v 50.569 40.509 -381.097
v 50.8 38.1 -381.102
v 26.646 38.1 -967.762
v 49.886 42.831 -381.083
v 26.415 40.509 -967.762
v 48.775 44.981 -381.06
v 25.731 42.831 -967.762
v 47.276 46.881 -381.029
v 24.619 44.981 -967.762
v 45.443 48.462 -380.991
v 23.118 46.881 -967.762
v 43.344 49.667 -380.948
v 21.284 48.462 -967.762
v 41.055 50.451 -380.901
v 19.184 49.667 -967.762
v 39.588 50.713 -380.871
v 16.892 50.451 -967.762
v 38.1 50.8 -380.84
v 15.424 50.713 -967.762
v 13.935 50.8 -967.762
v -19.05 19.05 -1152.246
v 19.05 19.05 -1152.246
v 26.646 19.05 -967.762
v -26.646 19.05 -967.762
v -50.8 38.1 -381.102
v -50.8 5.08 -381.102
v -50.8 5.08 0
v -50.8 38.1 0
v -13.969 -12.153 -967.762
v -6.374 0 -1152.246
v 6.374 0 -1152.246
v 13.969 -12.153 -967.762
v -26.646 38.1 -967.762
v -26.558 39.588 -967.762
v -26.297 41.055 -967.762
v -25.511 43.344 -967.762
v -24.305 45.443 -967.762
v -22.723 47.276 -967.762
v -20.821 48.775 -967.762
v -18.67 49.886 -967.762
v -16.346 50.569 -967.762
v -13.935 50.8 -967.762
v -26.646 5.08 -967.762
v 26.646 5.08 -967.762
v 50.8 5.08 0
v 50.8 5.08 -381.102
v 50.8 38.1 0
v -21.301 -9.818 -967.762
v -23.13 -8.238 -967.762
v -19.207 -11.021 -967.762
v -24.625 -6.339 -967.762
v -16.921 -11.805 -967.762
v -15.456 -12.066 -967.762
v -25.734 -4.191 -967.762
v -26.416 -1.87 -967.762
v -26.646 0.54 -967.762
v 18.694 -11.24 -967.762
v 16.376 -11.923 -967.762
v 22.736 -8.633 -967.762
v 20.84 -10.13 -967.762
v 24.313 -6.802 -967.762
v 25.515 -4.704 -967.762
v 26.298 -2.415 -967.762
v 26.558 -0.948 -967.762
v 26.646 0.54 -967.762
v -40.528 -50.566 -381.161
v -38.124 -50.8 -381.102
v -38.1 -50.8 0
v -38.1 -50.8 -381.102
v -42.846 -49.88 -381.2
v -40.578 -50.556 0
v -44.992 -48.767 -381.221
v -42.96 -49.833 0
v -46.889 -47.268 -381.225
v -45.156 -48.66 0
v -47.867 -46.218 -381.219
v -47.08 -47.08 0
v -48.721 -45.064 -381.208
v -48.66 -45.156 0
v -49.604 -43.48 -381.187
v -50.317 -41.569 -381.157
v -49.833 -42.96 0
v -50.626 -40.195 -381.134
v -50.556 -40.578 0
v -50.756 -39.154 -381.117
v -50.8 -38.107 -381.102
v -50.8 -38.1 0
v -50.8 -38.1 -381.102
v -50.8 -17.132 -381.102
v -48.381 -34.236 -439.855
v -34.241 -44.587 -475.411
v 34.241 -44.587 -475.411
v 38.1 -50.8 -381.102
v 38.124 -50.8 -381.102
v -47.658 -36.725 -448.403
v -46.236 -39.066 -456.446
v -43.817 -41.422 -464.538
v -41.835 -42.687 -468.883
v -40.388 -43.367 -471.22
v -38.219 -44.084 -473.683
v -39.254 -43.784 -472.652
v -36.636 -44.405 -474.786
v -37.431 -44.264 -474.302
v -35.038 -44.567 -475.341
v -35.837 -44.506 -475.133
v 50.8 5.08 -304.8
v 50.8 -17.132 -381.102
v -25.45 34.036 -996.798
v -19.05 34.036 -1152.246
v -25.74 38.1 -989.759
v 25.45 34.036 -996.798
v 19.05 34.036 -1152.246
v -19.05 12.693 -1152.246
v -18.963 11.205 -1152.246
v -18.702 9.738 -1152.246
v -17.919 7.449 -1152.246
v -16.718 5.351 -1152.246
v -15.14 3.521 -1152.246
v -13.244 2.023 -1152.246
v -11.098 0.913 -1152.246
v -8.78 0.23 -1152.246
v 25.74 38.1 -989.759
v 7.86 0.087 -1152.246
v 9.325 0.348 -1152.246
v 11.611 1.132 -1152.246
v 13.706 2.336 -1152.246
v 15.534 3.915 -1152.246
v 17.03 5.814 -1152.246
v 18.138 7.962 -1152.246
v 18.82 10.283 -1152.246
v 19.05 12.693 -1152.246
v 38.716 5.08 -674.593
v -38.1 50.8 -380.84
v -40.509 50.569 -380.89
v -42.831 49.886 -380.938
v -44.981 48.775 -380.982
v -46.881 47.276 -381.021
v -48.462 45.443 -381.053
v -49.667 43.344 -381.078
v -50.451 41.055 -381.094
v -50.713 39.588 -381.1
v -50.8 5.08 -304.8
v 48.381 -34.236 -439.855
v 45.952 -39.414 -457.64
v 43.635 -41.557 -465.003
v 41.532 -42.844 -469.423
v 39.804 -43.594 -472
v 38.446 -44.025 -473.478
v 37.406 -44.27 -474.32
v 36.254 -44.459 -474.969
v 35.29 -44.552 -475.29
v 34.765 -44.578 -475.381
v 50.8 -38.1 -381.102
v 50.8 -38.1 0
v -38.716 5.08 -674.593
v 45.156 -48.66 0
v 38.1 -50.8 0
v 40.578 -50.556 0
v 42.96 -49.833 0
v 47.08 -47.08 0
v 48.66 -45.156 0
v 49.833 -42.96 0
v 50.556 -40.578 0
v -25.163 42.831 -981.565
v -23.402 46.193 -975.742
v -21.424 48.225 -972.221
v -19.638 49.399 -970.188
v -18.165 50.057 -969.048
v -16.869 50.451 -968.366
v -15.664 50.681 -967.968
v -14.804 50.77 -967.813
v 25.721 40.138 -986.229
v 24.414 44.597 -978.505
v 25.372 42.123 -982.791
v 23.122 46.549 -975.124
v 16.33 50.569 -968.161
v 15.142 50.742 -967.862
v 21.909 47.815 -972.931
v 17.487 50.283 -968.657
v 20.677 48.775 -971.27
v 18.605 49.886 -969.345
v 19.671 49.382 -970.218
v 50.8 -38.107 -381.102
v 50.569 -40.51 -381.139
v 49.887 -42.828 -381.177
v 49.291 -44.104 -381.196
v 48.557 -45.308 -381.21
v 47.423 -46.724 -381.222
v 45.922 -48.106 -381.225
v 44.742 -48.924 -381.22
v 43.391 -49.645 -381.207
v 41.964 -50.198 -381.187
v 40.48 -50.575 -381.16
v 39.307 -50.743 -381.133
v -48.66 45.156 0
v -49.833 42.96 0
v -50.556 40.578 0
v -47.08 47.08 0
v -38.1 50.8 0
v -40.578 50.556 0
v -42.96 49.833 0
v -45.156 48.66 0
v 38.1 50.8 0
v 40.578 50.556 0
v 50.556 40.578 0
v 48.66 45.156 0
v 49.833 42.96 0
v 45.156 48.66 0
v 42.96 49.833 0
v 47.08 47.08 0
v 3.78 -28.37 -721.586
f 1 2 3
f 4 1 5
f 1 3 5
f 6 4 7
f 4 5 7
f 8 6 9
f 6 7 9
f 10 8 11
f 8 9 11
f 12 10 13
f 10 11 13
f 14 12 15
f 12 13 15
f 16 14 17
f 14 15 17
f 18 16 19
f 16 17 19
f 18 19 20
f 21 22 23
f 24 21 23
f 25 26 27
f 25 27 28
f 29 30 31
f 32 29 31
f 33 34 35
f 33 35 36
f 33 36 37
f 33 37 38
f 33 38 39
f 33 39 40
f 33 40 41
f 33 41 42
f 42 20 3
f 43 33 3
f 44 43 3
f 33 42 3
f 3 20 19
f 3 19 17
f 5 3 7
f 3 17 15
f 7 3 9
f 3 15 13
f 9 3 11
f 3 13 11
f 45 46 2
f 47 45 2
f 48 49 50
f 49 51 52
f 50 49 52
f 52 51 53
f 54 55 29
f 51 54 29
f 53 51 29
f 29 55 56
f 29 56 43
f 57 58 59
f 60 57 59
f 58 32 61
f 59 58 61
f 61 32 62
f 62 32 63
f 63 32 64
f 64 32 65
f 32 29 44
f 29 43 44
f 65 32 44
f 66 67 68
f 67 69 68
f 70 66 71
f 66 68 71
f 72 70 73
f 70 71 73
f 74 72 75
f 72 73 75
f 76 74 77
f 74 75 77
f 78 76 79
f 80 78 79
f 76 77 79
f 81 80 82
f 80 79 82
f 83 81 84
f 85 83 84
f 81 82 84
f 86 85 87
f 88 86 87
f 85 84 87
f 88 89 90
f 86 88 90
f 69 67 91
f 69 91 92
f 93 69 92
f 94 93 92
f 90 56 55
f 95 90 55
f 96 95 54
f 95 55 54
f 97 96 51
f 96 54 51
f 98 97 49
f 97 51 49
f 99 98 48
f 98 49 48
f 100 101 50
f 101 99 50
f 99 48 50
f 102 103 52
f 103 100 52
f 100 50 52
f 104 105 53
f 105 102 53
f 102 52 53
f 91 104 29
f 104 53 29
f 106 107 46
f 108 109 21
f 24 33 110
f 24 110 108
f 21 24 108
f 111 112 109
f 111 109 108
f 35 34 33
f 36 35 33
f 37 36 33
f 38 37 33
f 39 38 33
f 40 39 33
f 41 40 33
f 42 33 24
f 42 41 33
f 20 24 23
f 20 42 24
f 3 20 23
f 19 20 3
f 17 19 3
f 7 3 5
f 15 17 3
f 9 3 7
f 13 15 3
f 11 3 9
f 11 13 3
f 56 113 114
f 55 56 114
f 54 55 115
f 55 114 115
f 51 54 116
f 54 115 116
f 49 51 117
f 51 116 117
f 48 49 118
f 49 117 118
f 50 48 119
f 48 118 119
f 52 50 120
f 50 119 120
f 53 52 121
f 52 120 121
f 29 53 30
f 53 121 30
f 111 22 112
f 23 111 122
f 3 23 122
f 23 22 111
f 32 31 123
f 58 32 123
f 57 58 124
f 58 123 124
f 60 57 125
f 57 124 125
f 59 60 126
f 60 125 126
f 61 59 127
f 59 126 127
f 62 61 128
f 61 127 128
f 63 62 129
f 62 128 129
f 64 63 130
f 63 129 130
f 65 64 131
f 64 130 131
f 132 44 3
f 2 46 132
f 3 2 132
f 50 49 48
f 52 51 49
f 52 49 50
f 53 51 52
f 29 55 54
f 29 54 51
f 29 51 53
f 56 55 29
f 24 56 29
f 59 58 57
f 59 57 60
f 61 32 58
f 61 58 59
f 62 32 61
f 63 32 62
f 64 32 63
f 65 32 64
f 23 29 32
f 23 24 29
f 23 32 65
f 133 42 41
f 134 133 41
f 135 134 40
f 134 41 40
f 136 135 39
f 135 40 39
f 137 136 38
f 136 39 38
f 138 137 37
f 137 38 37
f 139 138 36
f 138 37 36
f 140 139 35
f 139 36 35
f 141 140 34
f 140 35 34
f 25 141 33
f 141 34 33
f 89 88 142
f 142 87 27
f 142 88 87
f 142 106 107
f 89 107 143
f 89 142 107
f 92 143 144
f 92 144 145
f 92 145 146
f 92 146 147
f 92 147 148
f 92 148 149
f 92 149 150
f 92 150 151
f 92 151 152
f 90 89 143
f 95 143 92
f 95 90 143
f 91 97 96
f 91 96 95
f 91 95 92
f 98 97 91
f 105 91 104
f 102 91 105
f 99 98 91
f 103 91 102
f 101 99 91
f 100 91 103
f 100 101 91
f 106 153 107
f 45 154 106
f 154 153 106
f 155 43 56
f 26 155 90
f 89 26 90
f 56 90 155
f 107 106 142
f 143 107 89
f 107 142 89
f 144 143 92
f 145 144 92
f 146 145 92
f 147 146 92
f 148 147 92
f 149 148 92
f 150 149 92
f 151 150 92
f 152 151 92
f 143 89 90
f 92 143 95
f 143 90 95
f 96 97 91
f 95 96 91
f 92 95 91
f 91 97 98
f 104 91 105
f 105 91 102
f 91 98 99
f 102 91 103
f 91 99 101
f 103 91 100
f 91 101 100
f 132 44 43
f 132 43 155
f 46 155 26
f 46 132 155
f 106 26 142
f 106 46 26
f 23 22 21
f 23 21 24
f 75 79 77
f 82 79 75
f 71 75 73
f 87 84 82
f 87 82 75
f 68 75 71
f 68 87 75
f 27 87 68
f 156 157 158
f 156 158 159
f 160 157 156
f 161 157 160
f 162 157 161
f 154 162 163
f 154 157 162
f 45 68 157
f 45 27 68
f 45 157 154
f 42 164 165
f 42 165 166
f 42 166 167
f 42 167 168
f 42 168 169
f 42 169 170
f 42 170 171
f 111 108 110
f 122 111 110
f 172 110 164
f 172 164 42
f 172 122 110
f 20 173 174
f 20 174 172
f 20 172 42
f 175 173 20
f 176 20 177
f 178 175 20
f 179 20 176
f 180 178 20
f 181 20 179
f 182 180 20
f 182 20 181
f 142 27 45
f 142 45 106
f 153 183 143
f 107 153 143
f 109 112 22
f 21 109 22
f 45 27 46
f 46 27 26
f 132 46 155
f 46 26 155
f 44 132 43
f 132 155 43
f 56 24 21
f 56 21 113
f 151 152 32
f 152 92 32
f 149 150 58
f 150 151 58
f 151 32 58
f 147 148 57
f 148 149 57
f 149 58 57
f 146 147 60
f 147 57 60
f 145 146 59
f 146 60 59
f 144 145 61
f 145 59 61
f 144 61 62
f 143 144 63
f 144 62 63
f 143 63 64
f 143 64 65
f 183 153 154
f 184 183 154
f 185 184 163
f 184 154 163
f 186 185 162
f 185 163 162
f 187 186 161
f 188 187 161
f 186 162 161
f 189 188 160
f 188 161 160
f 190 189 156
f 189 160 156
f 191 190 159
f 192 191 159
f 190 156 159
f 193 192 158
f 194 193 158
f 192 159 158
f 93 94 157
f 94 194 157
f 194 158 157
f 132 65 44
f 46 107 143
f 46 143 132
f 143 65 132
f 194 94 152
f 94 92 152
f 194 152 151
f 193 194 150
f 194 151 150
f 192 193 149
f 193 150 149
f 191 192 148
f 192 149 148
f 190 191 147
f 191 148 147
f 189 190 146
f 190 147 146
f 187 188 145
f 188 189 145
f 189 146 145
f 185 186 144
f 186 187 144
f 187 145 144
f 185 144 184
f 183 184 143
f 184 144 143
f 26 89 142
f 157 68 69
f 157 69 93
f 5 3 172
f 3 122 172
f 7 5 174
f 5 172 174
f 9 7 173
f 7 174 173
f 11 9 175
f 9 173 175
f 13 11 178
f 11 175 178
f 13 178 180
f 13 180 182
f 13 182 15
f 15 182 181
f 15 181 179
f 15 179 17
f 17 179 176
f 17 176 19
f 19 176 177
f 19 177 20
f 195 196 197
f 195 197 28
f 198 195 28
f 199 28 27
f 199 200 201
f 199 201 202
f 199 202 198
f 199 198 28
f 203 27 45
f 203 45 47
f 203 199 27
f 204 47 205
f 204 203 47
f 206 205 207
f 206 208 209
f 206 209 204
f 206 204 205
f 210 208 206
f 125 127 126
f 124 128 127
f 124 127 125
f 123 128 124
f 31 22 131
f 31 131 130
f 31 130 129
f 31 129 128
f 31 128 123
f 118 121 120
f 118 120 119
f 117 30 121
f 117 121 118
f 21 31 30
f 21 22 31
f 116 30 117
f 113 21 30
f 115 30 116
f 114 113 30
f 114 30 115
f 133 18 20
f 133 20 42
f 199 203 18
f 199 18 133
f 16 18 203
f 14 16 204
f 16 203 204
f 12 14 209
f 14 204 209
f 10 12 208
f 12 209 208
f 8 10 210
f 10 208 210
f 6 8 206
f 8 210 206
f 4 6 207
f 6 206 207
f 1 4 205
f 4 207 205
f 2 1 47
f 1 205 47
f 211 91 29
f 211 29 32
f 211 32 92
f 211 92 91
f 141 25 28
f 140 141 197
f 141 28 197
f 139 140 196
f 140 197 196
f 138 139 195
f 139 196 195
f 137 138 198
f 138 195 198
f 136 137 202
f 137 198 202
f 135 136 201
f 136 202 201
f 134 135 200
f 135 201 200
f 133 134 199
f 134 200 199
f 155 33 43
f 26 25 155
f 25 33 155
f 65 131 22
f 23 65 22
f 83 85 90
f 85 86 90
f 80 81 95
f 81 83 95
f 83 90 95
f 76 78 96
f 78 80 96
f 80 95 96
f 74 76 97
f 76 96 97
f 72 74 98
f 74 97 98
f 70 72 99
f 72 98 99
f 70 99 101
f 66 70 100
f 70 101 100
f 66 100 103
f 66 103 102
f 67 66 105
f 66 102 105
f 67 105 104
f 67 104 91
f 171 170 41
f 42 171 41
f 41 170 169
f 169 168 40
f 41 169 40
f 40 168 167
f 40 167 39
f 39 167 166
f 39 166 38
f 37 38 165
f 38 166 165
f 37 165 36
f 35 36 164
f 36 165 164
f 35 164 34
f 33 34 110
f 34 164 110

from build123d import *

# Parameters (mm, degrees)
SKETCH1_W              = 101.6
SKETCH1_H              = 101.6
BOSS_EXTRUDE1_DEPTH    = 381.1016
FILLET1_R              = 12.7
CUT_EXTRUDE2_DEPTH     = 177.8508
SPLIT1_SURFACE_1_BACK  = 1162.17
SPLIT1_SURFACE_1_DEPTH = 2324.34
SPLIT1_SURFACE_2_BACK  = 1162.17
SPLIT1_SURFACE_2_DEPTH = 2324.34


with BuildPart() as part:
    # Sketch1 → Boss-Extrude1 (new body)
    with BuildSketch(Plane.XY):
        Rectangle(SKETCH1_W, SKETCH1_H)
    extrude(amount=-BOSS_EXTRUDE1_DEPTH)

    # Sketch2 → section 0 of loft1
    with BuildSketch(Plane(origin=(0, 0, -1152.2456), x_dir=(-1, 0, 0), z_dir=(0, 0, -1)), mode=Mode.PRIVATE) as loft1_s0:
        with BuildLine():
            Line((-19.05, 50.8), (19.05, 50.8))
            Line((19.05, 50.8), (19.05, 0))
            Line((19.05, 0), (-19.05, 0))
            Line((-19.05, 0), (-19.05, 50.8))
        make_face()
    # loft up to a face of the part (loft1)
    loft([loft1_s0.sketch, part.faces().sort_by_distance((0, 0, -381.1016))[0]])

    # Fillet1
    # the kernel refuses this fillet: 12.7 mm, written as the material it takes off along each edge
    with BuildSketch(Plane(origin=(-50.8, -50.8, 31.75), x_dir=(1, 0, 0), z_dir=(0, 0, -1)), Plane(origin=(-50.8, 50.8, 31.75), x_dir=(0, -1, 0), z_dir=(0, 0, -1))) as fillet1_piece_1:
        with BuildLine():
            CenterArc((FILLET1_R, -FILLET1_R), FILLET1_R, 90, 90)
            Line((0, -FILLET1_R), (0, 0))
            Line((0, 0), (FILLET1_R, 0))
        make_face()
    extrude(amount=444.6016, mode=Mode.SUBTRACT)
    with BuildSketch(Plane(origin=(50.8, 50.8, 31.75), x_dir=(0, -1, 0), z_dir=(0, 0, -1)), Plane(origin=(50.8, -50.8, 31.75), x_dir=(-1, 0, 0), z_dir=(0, 0, -1))) as fillet1_piece_2:
        with BuildLine():
            CenterArc((FILLET1_R, FILLET1_R), FILLET1_R, 180, 90)
            Line((0, FILLET1_R), (0, 0))
            Line((0, 0), (FILLET1_R, 0))
        make_face()
    extrude(amount=444.6016, mode=Mode.SUBTRACT)
    with BuildSketch(Plane(origin=(17.750216352, 2.079653836, -1183.814745237), x_dir=(-0.999157137883709, -0.002698296397467829, 0.0409601393135606), z_dir=(0.04104891979132801, -0.06567827166612486, 0.9969961638917754))) as fillet1_piece_3:
        with BuildLine():
            CenterArc((FILLET1_R * 0.997299511279, -FILLET1_R), FILLET1_R, 90, 89.845064287)
            Line((-FILLET1_R * 0.00269683254081, -FILLET1_R * 0.997295864973), (0, 0))
            Line((0, 0), (FILLET1_R * 0.997299511279, 0))
        make_face()
    extrude(amount=836.795888178, mode=Mode.SUBTRACT)
    with BuildSketch(Plane(origin=(-17.750216352, 2.079653836, -1183.814745237), x_dir=(0.999157137883709, -0.0026982963974682855, 0.040960139313560615), z_dir=(-0.041048919791328055, -0.06567827166612487, 0.9969961638917754))) as fillet1_piece_4:
        with BuildLine():
            CenterArc((FILLET1_R * 0.997299511279, FILLET1_R), FILLET1_R, 180.154935713, 89.845064287)
            Line((-FILLET1_R * 0.00269683254081, FILLET1_R * 0.997295864973), (0, 0))
            Line((0, 0), (FILLET1_R * 0.997299511279, 0))
        make_face()
    extrude(amount=836.795888178, mode=Mode.SUBTRACT)
    with BuildSketch(Plane(origin=(-17.743876682, 50.8, -1183.968723142), x_dir=(0.9991534847855587, 0, 0.041137742291895554), z_dir=(-0.041137742291895554, 0, 0.9991534847855587))) as fillet1_piece_5:
        with BuildLine():
            CenterArc((FILLET1_R, -FILLET1_R), FILLET1_R, 90, 90)
            Line((0, -FILLET1_R), (0, 0))
            Line((0, 0), (FILLET1_R, 0))
        make_face()
    extrude(amount=835.297338189, mode=Mode.SUBTRACT)
    with BuildSketch(Plane(origin=(17.743876682, 50.8, -1183.968723142), x_dir=(-0.9991534847855587, 0, 0.041137742291895485), z_dir=(0.04113774229189549, 0, 0.9991534847855587))) as fillet1_piece_6:
        with BuildLine():
            CenterArc((FILLET1_R, FILLET1_R), FILLET1_R, 180, 90)
            Line((0, FILLET1_R), (0, 0))
            Line((0, 0), (FILLET1_R, 0))
        make_face()
    extrude(amount=835.297338189, mode=Mode.SUBTRACT)

    # Sketch4 → Cut-Extrude2 (cut, symmetric)
    with BuildSketch(Plane(origin=(0, 0, 0), x_dir=(0, 0, -1), z_dir=(1, 0, 0))):
        Polygon((1152.2456, 50.8), (1152.2456, 34.036), (996.7976, 34.036), (967.761500262, 50.8), align=None)
    extrude(amount=CUT_EXTRUDE2_DEPTH, both=True, mode=Mode.SUBTRACT)


with BuildPart() as body_2:
    # Split1: the piece behind the surface
    add(part.part)
    # Split1 surface: a surface, the sketch's curves swept straight by 2324.34 mm
    with BuildLine(Plane(origin=(50.8, 0, 0), x_dir=(0, 0, -1), z_dir=(1, 0, 0)).offset(-SPLIT1_SURFACE_1_BACK), mode=Mode.PRIVATE) as split1_surface_1_path:
        Line((0, -50.8), (0, 5.08))
        Line((0, 5.08), (304.8, 5.08))
        Line((304.8, 5.08), (475.411000163, -44.587259541))
        Line((475.411000163, -44.587259541), (381.1016, -50.8))
        Line((381.1016, -50.8), (0, -50.8))
    split1_surface_1 = Shell.extrude(split1_surface_1_path.wire(), (1 * SPLIT1_SURFACE_1_DEPTH, 0 * SPLIT1_SURFACE_1_DEPTH, 0 * SPLIT1_SURFACE_1_DEPTH))
    split(bisect_by=split1_surface_1, keep=Keep.BOTTOM)


with BuildPart() as part_1:
    add(part.part)

    # Split1: split by a surface, the side it looks to stays
    # Split1 surface: a surface, the sketch's curves swept straight by 2324.34 mm
    with BuildLine(Plane(origin=(50.8, 0, 0), x_dir=(0, 0, -1), z_dir=(1, 0, 0)).offset(-SPLIT1_SURFACE_2_BACK), mode=Mode.PRIVATE) as split1_surface_2_path:
        Line((0, -50.8), (0, 5.08))
        Line((0, 5.08), (304.8, 5.08))
        Line((304.8, 5.08), (475.411000163, -44.587259541))
        Line((475.411000163, -44.587259541), (381.1016, -50.8))
        Line((381.1016, -50.8), (0, -50.8))
    split1_surface_2 = Shell.extrude(split1_surface_2_path.wire(), (1 * SPLIT1_SURFACE_2_DEPTH, 0 * SPLIT1_SURFACE_2_DEPTH, 0 * SPLIT1_SURFACE_2_DEPTH))
    split(bisect_by=split1_surface_2, keep=Keep.TOP)


with BuildPart() as body_3:
    # Split3: the piece on the far side of the plane
    add(part_1.part)
    split(bisect_by=Plane.XY.offset(-967.761500262), keep=Keep.BOTTOM)


with BuildPart() as part_2:
    add(part_1.part)

    # Split3
    split(bisect_by=Plane.XY.offset(-967.761500262), keep=Keep.TOP)


with BuildPart() as body_4:
    # Split2: the piece on the far side of the plane
    add(part_2.part)
    split(bisect_by=Plane.ZX.offset(5.08), keep=Keep.BOTTOM)


with BuildPart() as part_3:
    add(part_2.part)

    # Split2
    split(bisect_by=Plane.ZX.offset(5.08), keep=Keep.TOP)


with BuildPart() as body_5:
    # Split4: the piece on the far side of the plane
    add(body_3.part)
    split(bisect_by=Plane.ZX.offset(19.05), keep=Keep.BOTTOM)


with BuildPart() as body_3_1:
    add(body_3.part)

    # Split4
    split(bisect_by=Plane.ZX.offset(19.05), keep=Keep.TOP)


solid = Compound([body_2.part, body_4.part, part_3.part, body_5.part, body_3_1.part])
